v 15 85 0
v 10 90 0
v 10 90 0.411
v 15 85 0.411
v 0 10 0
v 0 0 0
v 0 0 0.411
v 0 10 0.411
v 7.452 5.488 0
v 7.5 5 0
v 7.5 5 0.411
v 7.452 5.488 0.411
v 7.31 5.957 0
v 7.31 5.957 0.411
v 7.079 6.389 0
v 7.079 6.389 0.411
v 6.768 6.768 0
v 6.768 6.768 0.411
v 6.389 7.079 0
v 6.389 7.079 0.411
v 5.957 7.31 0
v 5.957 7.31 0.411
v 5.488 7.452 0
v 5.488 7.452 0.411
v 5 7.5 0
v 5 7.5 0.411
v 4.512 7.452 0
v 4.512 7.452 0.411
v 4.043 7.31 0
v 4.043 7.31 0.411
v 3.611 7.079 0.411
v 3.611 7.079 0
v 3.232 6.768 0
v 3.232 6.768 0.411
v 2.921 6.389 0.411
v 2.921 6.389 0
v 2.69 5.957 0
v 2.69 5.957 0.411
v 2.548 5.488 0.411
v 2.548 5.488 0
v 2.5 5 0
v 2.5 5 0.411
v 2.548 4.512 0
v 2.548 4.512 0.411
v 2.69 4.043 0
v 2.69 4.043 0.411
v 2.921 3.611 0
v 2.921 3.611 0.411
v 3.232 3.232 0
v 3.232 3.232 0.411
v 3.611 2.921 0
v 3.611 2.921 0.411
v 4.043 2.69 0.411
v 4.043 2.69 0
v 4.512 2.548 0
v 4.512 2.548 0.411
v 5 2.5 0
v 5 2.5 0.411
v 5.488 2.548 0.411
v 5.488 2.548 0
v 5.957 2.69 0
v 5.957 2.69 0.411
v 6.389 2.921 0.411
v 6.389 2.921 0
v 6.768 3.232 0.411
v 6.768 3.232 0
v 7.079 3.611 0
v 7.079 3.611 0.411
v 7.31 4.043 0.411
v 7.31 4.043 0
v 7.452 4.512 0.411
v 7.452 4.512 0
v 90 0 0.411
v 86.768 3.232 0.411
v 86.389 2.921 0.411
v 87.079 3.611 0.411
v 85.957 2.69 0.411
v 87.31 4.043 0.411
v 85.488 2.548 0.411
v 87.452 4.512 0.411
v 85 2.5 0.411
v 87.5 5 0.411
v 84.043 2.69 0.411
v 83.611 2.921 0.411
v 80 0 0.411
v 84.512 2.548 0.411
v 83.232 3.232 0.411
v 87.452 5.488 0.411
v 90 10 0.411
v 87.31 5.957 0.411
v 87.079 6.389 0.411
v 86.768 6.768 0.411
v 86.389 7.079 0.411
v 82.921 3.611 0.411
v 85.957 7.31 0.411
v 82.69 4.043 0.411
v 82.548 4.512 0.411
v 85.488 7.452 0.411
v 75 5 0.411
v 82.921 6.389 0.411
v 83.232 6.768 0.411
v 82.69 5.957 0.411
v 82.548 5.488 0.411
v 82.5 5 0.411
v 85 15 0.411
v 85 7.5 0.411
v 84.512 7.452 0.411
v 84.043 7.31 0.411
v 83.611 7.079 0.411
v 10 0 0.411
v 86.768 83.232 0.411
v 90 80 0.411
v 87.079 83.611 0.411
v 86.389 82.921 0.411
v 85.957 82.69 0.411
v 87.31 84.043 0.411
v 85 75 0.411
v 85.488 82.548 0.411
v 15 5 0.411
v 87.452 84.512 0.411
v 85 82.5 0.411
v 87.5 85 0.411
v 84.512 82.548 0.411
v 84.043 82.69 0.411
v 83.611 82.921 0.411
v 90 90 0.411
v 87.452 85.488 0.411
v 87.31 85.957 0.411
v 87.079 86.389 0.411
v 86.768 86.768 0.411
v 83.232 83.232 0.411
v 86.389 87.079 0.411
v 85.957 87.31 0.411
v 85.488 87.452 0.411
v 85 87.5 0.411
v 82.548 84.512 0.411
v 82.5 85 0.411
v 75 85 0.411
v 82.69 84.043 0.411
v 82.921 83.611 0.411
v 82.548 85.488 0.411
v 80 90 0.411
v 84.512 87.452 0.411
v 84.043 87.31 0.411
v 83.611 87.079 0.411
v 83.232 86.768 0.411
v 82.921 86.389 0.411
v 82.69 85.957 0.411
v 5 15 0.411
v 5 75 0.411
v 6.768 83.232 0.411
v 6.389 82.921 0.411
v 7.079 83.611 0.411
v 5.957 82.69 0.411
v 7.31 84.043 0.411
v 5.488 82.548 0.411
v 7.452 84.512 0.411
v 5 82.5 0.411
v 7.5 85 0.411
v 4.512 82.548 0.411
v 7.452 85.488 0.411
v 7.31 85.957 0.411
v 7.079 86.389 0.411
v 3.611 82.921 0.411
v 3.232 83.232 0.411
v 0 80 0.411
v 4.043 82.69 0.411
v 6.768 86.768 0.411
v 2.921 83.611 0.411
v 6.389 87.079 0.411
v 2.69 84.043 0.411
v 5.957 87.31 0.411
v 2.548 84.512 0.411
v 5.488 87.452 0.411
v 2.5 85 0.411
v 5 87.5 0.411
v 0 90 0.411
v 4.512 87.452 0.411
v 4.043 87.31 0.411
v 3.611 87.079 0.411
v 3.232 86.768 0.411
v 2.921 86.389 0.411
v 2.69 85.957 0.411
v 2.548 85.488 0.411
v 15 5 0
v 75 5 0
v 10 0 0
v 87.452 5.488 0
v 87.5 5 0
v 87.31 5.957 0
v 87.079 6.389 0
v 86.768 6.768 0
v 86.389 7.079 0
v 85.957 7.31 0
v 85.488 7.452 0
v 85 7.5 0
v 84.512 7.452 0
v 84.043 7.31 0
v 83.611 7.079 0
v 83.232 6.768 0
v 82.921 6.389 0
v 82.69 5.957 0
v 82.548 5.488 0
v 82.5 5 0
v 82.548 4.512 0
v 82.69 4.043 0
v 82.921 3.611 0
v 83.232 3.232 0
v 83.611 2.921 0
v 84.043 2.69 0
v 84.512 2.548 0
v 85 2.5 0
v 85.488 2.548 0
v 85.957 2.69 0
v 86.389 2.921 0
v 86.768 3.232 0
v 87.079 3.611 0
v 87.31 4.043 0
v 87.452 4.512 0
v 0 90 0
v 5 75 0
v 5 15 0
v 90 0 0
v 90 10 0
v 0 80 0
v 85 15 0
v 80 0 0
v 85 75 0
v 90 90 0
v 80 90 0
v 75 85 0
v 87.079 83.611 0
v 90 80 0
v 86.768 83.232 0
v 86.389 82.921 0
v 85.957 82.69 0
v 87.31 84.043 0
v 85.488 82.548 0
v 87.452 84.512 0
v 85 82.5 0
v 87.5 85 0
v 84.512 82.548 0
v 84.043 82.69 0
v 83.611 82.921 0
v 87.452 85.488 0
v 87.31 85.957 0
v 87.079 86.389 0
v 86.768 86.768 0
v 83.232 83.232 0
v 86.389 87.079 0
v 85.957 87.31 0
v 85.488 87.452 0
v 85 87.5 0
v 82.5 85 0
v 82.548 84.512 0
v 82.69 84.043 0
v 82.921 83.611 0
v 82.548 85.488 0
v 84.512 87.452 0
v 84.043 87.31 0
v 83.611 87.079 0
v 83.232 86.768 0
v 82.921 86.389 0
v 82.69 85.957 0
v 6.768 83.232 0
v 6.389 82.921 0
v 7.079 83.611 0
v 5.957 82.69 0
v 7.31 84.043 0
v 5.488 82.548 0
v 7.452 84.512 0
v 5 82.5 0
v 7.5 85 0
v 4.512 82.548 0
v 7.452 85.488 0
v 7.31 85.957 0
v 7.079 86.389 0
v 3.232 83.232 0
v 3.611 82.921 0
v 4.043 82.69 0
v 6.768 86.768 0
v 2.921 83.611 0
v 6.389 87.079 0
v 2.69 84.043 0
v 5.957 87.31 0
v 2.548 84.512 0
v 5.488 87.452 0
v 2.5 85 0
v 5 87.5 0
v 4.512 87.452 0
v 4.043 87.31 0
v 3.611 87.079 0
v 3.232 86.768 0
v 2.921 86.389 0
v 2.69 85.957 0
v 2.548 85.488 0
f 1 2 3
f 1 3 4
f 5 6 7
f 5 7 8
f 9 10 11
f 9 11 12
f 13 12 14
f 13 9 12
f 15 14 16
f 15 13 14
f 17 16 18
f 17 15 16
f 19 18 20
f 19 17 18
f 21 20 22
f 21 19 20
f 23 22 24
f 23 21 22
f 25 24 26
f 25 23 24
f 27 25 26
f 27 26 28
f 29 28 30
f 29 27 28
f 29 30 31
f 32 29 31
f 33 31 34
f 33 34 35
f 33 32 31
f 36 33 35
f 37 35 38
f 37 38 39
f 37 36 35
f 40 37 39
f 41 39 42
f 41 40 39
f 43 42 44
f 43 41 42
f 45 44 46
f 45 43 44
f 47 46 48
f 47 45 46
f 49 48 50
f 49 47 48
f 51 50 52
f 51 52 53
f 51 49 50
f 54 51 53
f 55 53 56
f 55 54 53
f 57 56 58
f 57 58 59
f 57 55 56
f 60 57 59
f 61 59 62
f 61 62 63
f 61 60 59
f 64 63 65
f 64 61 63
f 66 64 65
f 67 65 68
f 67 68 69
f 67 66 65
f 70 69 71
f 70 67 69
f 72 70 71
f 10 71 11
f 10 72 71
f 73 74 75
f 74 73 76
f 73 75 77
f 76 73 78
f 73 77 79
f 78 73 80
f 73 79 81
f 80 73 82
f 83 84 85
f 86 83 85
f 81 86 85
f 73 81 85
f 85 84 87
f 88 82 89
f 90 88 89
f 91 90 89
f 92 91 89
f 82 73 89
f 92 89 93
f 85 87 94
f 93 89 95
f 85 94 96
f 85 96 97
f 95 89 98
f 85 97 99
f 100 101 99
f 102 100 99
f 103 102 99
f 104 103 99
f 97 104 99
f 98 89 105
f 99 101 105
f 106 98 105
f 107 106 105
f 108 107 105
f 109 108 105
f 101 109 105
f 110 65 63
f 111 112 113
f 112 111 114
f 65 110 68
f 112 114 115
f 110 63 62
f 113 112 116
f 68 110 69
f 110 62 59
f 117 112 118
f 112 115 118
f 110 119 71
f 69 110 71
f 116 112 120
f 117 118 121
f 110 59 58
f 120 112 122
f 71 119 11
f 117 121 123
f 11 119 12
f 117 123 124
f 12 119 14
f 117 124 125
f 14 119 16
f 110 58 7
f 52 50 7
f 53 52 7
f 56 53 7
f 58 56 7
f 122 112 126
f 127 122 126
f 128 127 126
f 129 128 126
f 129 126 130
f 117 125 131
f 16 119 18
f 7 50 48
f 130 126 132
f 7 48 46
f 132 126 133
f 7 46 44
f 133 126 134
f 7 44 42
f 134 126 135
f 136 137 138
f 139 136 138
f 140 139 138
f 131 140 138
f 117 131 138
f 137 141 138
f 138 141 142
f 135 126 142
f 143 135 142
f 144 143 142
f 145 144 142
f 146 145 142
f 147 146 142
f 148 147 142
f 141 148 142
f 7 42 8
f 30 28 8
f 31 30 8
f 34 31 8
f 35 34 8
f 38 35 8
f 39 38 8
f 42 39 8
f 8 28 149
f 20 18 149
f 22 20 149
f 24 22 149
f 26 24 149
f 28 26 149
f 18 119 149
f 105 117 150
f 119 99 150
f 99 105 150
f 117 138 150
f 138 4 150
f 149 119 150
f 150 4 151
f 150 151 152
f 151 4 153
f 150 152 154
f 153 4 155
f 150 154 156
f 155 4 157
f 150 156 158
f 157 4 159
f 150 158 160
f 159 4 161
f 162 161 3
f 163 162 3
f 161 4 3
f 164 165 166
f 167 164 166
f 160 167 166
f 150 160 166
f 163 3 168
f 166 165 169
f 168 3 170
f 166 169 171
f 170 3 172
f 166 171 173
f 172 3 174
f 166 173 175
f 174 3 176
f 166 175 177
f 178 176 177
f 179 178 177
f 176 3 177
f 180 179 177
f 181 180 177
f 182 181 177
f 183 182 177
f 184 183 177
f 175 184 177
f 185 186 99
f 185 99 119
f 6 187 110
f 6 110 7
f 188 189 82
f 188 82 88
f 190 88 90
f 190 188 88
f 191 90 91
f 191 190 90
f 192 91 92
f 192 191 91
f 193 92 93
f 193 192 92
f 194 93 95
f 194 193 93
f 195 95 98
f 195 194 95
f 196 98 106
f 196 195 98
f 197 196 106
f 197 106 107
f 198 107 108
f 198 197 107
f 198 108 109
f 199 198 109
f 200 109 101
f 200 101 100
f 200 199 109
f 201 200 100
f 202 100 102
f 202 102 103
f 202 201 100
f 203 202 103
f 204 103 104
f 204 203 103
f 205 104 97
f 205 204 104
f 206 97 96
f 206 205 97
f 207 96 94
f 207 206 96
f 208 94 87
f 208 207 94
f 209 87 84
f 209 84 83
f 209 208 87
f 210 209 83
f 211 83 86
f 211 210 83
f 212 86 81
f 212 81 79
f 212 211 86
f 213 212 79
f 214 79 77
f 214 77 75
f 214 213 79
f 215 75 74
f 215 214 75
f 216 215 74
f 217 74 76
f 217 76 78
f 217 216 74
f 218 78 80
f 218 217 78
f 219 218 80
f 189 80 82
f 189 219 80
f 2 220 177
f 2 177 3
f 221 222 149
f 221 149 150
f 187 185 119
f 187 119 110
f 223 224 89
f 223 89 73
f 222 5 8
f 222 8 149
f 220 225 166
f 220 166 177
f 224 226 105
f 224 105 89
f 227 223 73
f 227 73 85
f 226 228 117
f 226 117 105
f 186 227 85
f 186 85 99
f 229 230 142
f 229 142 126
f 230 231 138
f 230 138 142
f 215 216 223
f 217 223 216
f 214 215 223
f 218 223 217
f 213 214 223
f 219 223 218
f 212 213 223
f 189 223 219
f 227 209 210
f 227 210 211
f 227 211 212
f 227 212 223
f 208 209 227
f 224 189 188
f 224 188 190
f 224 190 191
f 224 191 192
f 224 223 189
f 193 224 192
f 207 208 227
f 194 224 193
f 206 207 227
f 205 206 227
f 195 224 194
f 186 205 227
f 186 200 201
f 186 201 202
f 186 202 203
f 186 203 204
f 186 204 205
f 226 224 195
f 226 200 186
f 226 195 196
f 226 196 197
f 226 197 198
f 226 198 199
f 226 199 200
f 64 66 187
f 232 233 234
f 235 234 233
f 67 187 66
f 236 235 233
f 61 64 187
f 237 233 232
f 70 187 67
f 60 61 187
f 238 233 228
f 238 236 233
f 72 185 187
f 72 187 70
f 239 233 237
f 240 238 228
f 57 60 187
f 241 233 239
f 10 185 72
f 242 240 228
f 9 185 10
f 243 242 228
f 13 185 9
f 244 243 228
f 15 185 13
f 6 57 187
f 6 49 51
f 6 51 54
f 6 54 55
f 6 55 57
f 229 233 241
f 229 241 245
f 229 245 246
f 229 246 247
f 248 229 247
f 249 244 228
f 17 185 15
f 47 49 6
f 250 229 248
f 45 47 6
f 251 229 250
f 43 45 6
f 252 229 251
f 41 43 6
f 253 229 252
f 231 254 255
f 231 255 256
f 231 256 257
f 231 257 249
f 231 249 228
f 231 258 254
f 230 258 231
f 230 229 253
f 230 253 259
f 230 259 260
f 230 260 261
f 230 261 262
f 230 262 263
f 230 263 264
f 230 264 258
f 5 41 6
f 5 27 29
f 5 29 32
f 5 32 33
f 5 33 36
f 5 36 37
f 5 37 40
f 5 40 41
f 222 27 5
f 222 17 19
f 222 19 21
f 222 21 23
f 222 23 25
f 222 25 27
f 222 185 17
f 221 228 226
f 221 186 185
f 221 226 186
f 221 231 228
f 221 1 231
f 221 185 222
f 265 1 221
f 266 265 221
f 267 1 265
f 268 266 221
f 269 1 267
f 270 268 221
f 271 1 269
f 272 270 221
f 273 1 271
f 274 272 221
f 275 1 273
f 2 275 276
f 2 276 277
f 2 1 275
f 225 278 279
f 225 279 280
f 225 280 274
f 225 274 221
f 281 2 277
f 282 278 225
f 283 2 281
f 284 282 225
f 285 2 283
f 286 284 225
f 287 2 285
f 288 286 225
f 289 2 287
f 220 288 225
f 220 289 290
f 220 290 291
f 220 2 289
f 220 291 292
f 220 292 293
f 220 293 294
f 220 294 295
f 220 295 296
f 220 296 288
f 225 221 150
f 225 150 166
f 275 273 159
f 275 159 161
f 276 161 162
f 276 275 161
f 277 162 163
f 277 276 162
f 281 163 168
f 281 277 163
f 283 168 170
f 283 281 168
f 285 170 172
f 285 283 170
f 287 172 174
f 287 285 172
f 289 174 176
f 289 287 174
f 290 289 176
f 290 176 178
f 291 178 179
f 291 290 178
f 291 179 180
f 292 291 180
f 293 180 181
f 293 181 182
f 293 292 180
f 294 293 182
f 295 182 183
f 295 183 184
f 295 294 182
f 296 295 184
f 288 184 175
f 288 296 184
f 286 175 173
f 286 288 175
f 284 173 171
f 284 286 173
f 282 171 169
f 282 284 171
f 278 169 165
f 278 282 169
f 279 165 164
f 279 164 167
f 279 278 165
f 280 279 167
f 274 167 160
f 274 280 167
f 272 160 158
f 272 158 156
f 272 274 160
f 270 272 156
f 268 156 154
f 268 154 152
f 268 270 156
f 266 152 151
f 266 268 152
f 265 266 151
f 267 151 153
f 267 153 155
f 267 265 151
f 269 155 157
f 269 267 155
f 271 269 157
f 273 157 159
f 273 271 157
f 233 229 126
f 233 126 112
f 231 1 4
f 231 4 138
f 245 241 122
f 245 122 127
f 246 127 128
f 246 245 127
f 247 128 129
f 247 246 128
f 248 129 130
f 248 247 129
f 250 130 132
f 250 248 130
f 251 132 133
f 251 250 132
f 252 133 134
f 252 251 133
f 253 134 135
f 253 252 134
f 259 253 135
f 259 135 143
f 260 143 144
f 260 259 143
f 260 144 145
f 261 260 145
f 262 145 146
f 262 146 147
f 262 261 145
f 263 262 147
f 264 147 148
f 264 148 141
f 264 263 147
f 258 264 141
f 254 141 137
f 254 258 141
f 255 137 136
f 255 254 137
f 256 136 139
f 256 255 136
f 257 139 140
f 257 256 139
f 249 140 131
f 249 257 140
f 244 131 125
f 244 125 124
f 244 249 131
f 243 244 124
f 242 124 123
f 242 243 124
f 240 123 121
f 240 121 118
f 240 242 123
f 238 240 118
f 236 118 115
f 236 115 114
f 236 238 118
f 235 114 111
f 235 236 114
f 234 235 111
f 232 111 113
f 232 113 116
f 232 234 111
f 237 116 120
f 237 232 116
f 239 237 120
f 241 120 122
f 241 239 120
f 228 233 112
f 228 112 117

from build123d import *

# Parameters (mm, degrees)
BOARD_DEPTH               = 0.41148
OTW_R_1_0_228_1_OUTLINE_R = 2.5
OTW_R_1_0_228_1_DEPTH     = 0.41148
OTW_R_1_0_228_2_OUTLINE_R = 2.5
OTW_R_1_0_228_2_DEPTH     = 0.41148
OTW_R_1_0_228_3_OUTLINE_R = 2.5
OTW_R_1_0_228_3_DEPTH     = 0.41148
OTW_R_1_0_228_4_OUTLINE_R = 2.5
OTW_R_1_0_228_4_DEPTH     = 0.41148


# Read off the part's stored shape, not the designer's step: Otwór #1 (0.228)1, Otwór #1 (0.228)2, Otwór #1 (0.228)3, Otwór #1 (0.228)4
with BuildPart() as part:
    # Szkic1 → Board (new body)
    with BuildSketch(Plane.XY):
        Polygon((90, 80), (85, 75), (85, 15), (90, 10), (90, 0), (80, 0), (75, 5), (15, 5), (10, 0), (0, 0), (0, 10), (5, 15), (5, 75), (0, 80), (0, 90), (10, 90), (15, 85), (75, 85), (80, 90), (90, 90), align=None)
    extrude(amount=BOARD_DEPTH)

    # Otwór #1 (0.228)1 outline → Otwór #1 (0.228)1 (cut)
    with BuildSketch(Plane.XY):
        with Locations((85, 85)):
            Circle(OTW_R_1_0_228_1_OUTLINE_R)
    extrude(amount=OTW_R_1_0_228_1_DEPTH, mode=Mode.SUBTRACT)

    # Otwór #1 (0.228)2 outline → Otwór #1 (0.228)2 (cut)
    with BuildSketch(Plane.XY):
        with Locations((5, 85)):
            Circle(OTW_R_1_0_228_2_OUTLINE_R)
    extrude(amount=OTW_R_1_0_228_2_DEPTH, mode=Mode.SUBTRACT)

    # Otwór #1 (0.228)3 outline → Otwór #1 (0.228)3 (cut)
    with BuildSketch(Plane.XY):
        with Locations((85, 5)):
            Circle(OTW_R_1_0_228_3_OUTLINE_R)
    extrude(amount=OTW_R_1_0_228_3_DEPTH, mode=Mode.SUBTRACT)

    # Otwór #1 (0.228)4 outline → Otwór #1 (0.228)4 (cut)
    with BuildSketch(Plane.XY):
        with Locations((5, 5)):
            Circle(OTW_R_1_0_228_4_OUTLINE_R)
    extrude(amount=OTW_R_1_0_228_4_DEPTH, mode=Mode.SUBTRACT)


solid = part.part
